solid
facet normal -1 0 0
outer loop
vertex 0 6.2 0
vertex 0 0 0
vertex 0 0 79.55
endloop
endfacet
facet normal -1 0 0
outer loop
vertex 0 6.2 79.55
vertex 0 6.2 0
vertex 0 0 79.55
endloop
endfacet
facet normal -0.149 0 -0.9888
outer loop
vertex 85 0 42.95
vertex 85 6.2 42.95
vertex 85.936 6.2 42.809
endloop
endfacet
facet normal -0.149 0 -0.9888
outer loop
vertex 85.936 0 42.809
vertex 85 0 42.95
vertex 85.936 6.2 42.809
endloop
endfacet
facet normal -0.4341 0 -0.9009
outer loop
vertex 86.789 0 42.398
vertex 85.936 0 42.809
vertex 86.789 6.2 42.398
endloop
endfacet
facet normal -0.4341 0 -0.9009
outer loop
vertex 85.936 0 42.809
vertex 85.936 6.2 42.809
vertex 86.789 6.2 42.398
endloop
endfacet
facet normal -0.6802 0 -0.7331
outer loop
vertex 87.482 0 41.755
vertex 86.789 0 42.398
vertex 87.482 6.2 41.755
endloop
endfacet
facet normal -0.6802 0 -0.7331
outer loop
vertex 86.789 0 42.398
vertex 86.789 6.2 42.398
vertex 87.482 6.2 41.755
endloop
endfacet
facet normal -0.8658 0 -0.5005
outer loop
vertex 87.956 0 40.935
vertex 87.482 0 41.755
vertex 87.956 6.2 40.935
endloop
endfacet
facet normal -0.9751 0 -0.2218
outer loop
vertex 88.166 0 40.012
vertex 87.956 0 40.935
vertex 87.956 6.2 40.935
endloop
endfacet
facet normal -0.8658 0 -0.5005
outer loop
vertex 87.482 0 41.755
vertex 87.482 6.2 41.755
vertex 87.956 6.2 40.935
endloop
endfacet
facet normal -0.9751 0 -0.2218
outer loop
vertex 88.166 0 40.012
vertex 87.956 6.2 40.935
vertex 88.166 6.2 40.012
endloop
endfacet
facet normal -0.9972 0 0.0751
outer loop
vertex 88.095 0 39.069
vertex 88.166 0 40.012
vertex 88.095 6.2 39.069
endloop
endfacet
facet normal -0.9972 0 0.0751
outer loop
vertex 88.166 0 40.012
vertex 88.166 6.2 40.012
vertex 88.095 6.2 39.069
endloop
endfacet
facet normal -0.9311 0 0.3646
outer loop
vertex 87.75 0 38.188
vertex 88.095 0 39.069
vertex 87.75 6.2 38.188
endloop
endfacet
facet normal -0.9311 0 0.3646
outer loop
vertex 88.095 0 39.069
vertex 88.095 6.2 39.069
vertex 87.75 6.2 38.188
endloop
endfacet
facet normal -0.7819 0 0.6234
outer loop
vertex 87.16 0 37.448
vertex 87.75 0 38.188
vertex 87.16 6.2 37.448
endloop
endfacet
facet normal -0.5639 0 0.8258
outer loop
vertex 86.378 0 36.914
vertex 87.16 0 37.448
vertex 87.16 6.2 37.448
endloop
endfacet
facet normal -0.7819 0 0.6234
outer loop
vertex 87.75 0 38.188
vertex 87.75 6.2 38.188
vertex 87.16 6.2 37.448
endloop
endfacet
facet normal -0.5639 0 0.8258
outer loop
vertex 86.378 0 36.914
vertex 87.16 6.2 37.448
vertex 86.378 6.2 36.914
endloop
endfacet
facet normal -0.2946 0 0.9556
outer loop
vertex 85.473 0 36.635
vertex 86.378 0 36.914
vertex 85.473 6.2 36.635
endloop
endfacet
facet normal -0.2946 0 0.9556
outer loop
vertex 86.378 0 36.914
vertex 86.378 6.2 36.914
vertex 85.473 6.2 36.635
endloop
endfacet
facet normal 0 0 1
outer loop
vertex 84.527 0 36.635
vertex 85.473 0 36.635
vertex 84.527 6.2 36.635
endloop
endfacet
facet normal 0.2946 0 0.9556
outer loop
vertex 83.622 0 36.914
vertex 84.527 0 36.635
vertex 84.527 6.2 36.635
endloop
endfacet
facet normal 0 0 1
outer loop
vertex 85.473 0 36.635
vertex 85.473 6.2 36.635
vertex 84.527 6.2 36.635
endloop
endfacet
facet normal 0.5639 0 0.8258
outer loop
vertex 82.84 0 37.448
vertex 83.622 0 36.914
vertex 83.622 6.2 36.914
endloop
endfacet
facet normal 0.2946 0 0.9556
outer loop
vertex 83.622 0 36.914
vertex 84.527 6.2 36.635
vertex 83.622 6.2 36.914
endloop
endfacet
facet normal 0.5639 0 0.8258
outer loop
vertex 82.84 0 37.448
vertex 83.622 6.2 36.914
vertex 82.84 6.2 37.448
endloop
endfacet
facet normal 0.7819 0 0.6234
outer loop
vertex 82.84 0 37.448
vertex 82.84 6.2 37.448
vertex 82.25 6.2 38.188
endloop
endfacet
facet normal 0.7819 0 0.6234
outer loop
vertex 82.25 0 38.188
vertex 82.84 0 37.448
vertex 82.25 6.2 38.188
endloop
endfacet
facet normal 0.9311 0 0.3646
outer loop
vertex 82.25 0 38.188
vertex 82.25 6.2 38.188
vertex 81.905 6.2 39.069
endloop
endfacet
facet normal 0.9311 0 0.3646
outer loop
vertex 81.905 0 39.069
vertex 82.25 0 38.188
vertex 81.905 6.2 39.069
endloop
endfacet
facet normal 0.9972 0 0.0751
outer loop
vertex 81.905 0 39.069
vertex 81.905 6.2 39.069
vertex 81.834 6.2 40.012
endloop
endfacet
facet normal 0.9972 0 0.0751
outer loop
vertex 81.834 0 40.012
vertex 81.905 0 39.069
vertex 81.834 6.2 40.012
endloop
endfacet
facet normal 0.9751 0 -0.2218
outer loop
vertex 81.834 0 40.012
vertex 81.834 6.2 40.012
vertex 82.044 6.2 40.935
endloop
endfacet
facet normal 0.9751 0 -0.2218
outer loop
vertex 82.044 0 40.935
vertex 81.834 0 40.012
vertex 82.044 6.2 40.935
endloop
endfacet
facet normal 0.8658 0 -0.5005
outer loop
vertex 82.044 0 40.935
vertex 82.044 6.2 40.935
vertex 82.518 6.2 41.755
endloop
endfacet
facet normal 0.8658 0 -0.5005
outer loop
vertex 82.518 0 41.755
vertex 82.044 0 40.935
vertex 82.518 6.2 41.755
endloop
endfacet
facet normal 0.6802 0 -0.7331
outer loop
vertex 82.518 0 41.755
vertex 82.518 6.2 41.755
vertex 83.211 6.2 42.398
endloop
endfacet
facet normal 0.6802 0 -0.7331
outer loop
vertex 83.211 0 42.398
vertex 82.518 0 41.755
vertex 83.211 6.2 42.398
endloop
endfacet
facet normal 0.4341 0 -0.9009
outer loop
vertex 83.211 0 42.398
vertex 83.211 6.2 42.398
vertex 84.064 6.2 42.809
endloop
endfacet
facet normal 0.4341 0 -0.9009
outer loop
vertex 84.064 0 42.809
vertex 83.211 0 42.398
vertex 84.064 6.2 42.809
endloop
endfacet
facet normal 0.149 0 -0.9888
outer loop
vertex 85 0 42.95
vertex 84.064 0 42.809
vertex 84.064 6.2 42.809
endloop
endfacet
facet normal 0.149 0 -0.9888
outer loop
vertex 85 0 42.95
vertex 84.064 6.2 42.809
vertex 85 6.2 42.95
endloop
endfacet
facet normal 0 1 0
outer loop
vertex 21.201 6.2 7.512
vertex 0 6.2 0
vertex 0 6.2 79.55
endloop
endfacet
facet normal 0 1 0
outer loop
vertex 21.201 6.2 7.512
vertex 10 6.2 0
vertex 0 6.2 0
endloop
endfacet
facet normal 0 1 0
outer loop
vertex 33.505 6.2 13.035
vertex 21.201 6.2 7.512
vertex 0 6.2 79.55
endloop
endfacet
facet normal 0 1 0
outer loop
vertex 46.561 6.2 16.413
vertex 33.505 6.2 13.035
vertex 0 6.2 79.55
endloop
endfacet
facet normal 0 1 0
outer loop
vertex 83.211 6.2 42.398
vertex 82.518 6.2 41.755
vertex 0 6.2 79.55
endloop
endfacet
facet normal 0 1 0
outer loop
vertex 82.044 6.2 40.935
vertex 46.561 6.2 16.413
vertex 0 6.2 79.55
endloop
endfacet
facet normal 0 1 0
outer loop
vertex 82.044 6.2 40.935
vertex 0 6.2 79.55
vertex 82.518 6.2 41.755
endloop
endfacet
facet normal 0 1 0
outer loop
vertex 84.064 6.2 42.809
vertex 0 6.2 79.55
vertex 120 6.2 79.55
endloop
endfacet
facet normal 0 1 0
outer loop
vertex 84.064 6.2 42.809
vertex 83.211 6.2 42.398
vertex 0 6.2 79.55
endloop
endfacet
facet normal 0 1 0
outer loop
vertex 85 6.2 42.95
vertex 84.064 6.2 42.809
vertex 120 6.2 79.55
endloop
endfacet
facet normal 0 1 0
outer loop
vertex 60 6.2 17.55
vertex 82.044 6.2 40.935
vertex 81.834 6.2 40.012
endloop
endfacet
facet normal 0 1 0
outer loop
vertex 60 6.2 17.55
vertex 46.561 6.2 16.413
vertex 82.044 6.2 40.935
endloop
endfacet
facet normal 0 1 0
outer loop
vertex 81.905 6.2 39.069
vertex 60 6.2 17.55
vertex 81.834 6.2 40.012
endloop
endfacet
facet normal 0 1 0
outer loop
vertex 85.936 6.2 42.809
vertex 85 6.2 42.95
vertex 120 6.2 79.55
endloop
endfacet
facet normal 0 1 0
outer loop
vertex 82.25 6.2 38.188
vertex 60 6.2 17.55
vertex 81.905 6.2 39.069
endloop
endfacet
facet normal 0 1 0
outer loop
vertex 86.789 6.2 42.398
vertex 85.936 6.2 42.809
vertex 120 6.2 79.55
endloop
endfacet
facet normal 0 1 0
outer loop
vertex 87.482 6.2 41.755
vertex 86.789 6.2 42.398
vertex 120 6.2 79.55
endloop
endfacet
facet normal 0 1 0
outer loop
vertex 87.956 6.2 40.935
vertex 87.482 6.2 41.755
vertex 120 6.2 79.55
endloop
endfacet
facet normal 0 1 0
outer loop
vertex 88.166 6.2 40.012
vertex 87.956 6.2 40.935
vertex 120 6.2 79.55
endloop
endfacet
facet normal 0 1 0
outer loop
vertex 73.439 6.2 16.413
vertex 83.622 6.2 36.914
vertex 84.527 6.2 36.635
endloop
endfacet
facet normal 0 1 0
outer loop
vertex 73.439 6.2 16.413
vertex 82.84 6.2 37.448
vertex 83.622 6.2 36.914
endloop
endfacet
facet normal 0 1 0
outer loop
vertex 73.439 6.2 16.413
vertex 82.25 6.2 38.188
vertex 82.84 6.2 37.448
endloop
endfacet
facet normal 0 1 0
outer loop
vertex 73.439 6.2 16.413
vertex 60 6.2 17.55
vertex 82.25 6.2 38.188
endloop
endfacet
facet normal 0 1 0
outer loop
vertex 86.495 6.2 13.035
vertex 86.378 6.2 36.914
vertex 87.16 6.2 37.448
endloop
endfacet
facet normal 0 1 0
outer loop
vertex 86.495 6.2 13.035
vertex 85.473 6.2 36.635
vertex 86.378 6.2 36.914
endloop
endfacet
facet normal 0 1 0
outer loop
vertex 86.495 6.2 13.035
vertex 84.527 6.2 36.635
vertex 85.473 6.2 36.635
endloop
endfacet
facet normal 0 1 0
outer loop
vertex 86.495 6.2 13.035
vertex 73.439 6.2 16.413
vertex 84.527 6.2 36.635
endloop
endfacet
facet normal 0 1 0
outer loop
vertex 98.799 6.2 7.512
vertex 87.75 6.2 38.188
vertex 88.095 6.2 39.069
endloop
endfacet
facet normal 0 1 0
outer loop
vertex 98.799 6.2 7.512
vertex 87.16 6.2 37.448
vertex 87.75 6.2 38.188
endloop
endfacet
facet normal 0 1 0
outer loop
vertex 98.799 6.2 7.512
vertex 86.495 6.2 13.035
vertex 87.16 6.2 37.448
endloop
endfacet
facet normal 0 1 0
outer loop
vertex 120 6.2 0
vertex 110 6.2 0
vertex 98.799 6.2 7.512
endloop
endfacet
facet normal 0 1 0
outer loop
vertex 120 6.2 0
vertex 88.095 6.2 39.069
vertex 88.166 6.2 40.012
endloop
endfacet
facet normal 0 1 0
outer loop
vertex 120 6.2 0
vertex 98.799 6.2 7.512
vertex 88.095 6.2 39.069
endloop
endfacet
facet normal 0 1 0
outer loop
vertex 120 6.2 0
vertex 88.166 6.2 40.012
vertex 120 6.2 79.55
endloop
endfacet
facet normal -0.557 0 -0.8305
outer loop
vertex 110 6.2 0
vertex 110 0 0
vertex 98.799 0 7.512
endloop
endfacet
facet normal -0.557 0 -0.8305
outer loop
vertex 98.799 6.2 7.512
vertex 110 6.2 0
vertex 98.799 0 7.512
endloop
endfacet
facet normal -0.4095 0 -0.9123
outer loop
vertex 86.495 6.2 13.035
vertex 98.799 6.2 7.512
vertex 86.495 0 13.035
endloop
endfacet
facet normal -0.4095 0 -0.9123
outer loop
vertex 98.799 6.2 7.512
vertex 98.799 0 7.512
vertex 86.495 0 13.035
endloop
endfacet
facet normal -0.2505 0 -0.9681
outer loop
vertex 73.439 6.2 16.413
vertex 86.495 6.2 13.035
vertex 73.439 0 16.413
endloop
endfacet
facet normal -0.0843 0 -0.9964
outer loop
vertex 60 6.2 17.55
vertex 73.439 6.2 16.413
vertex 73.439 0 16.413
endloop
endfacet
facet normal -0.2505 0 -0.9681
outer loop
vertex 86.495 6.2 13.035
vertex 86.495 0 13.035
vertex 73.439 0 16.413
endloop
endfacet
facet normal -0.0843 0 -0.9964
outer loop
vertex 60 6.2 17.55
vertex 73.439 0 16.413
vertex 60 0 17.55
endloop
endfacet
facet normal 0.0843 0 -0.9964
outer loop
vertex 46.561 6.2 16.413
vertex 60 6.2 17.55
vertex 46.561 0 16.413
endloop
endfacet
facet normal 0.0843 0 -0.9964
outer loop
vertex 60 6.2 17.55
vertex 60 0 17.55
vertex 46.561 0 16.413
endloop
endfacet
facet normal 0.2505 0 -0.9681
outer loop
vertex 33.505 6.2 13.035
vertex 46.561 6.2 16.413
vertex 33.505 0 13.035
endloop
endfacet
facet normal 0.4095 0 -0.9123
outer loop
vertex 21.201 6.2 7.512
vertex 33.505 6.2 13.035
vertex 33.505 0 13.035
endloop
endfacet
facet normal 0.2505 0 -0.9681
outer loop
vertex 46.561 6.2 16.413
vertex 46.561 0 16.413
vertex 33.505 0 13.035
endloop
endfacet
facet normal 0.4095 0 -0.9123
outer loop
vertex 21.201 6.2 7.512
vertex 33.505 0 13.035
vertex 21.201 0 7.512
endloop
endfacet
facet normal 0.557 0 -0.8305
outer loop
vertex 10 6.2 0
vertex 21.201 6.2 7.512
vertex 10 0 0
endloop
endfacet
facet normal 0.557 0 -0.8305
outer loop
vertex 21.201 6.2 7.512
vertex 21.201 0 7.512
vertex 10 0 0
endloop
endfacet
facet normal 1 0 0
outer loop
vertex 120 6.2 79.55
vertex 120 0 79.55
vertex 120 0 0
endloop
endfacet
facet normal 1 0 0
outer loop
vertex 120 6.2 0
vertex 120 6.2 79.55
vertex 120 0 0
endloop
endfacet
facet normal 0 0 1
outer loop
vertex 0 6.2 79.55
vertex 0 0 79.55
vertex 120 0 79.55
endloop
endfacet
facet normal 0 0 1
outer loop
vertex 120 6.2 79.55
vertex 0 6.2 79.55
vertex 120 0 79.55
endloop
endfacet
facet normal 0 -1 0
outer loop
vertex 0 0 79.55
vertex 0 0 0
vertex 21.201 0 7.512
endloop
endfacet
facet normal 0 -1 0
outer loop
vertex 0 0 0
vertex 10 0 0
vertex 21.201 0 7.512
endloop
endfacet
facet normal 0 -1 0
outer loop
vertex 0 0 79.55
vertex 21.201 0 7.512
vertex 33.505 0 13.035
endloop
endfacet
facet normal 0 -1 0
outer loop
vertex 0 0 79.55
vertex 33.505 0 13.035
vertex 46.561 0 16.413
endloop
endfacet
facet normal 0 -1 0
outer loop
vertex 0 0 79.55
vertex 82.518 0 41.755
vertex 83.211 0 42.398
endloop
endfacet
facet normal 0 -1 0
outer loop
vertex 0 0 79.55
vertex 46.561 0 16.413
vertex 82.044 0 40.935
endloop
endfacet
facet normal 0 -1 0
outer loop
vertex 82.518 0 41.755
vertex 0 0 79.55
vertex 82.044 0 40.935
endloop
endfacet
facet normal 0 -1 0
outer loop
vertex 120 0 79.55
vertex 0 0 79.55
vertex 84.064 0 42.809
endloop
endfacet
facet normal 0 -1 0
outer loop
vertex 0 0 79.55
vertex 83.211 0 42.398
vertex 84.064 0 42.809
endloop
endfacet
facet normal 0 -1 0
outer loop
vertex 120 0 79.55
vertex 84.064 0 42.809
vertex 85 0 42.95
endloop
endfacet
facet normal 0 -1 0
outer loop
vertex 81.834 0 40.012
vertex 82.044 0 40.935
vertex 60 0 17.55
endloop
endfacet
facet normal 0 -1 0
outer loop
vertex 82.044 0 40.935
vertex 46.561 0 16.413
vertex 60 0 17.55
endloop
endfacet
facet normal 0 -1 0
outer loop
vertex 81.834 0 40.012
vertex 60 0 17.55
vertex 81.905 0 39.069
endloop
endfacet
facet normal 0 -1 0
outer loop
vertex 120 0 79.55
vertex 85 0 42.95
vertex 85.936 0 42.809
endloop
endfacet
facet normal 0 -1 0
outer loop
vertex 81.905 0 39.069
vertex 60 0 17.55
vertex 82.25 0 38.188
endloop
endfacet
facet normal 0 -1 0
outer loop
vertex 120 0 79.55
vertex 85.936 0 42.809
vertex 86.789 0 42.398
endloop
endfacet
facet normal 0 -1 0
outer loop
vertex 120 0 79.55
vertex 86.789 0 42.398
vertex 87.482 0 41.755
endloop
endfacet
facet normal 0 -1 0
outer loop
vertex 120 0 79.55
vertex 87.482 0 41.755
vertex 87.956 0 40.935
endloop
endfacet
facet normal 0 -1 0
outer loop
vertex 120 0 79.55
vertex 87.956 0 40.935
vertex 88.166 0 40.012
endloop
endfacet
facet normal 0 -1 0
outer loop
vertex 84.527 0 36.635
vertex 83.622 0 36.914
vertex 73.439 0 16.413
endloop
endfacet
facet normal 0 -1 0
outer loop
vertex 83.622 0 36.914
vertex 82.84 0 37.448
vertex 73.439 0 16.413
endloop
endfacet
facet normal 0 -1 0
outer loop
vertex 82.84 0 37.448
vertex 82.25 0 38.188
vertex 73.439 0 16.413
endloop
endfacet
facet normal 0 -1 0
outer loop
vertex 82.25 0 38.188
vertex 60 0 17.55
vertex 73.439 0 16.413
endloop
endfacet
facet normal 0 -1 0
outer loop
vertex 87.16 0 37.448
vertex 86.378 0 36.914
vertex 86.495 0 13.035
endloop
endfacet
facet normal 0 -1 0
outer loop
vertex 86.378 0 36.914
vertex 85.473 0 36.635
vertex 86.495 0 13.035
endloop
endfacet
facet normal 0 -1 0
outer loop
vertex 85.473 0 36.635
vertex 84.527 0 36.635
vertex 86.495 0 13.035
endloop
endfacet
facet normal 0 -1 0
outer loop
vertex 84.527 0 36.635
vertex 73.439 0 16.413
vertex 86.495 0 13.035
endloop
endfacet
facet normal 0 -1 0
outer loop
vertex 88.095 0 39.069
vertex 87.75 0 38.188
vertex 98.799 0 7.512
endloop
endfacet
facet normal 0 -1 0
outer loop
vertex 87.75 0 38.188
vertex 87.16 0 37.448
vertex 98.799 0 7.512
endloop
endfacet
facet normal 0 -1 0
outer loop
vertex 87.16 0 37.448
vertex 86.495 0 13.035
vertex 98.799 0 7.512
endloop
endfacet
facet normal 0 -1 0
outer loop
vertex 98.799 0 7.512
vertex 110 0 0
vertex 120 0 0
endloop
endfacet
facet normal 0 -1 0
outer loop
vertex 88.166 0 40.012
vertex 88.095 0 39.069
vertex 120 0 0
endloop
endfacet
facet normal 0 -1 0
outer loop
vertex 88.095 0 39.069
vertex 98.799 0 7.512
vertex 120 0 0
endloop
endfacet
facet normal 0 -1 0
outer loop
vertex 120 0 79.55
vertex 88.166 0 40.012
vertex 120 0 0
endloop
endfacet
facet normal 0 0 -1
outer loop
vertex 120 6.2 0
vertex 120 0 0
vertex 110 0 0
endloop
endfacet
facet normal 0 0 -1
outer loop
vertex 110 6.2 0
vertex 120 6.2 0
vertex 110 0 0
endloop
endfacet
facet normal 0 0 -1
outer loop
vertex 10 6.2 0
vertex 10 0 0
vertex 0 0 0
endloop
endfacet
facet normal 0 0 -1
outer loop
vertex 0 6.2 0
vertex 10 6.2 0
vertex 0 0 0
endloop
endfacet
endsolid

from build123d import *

# Parameters (mm, degrees)
SALIENTE_EXTRUIR1_DEPTH = 6.2
CROQUIS2_R              = 3.175
CORTAR_EXTRUIR1_DEPTH   = 145.106369341


with BuildPart() as part:
    # Croquis1 → Saliente-Extruir1 (new body)
    with BuildSketch(Plane(origin=(0, 0, 0), x_dir=(1, 0, 0), z_dir=(0, 1, 0))):
        with BuildLine():
            Line((0, 0), (0, -79.550020016))
            Line((0, -79.550020016), (120, -79.550020016))
            Line((120, -79.550020016), (120, 0))
            Line((120, 0), (110, 0))
            ThreePointArc((110, 0), (60, -17.550020016), (10, 0))
            Line((10, 0), (0, 0))
        make_face()
    extrude(amount=SALIENTE_EXTRUIR1_DEPTH)

    # Croquis2 → Cortar-Extruir1 (cut, through all)
    with BuildSketch(Plane(origin=(0, 6.2, 0), x_dir=(1, 0, 0), z_dir=(0, 1, 0))):
        with Locations(Location((85, -39.775010008, 0), (0, 0, 270))):
            Circle(CROQUIS2_R)
    extrude(amount=-CORTAR_EXTRUIR1_DEPTH, mode=Mode.SUBTRACT)


solid = part.part
